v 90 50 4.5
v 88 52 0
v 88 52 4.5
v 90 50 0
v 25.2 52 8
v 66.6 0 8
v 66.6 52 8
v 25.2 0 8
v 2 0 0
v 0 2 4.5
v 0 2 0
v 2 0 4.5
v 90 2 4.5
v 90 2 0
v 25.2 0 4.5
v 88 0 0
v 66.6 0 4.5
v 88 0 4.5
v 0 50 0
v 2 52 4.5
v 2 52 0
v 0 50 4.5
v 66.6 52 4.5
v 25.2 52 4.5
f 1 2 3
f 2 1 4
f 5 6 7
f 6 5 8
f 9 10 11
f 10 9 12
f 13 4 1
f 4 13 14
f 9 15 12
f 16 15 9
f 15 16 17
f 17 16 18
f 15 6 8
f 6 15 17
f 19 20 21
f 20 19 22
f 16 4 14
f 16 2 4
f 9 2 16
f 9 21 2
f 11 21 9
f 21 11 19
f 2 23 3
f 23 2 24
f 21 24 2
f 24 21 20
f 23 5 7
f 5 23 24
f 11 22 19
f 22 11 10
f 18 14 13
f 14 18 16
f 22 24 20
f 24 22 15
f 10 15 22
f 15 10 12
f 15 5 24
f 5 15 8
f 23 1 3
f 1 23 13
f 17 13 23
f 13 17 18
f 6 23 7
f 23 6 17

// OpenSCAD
$fn = 32;

// ----------------------------------------------------------------------
// Stepped bar: centerstep, 90 x 52 x 8/4.5 mm
// ----------------------------------------------------------------------

// --- parameters (mm) ---
bar_l = 90;               // bar length, X
bar_w = 52;               // bar width, Y
plate_t = 8;              // thickness of the thick zone, Z
thin_t = 4.5;             // thickness of the thin zone
corner_c = 2;             // corner chamfer of the bar
step_cut = 3.5;           // material removed from the thin zone
thick_from = 25.2;        // start of the thick middle zone
thick_to = 66.6;          // end of the thick middle zone
depth_1 = 3.5;            // depth of cut 1 from the top face
depth_2 = 3.5;            // depth of cut 2 from the top face

profile = [[2, 0], [88, 0], [90, 2], [90, 50], [88, 52], [2, 52], [0, 50], [0, 2]];  // primary outline, 8 points, counter clockwise
void_1 = [[-1, -1], [25.2, -1], [25.2, 53], [-1, 53]];  // thin left end, 4 points
void_2 = [[66.6, -1], [91, -1], [91, 53], [66.6, 53]];  // thin right end, 4 points

// --- the one profile operation ---
difference() {
  linear_extrude(height = plate_t) polygon(points = profile);
  translate([0, 0, plate_t - depth_1])
    linear_extrude(height = depth_1 + 1) polygon(points = void_1);
  translate([0, 0, plate_t - depth_2])
    linear_extrude(height = depth_2 + 1) polygon(points = void_2);
}
